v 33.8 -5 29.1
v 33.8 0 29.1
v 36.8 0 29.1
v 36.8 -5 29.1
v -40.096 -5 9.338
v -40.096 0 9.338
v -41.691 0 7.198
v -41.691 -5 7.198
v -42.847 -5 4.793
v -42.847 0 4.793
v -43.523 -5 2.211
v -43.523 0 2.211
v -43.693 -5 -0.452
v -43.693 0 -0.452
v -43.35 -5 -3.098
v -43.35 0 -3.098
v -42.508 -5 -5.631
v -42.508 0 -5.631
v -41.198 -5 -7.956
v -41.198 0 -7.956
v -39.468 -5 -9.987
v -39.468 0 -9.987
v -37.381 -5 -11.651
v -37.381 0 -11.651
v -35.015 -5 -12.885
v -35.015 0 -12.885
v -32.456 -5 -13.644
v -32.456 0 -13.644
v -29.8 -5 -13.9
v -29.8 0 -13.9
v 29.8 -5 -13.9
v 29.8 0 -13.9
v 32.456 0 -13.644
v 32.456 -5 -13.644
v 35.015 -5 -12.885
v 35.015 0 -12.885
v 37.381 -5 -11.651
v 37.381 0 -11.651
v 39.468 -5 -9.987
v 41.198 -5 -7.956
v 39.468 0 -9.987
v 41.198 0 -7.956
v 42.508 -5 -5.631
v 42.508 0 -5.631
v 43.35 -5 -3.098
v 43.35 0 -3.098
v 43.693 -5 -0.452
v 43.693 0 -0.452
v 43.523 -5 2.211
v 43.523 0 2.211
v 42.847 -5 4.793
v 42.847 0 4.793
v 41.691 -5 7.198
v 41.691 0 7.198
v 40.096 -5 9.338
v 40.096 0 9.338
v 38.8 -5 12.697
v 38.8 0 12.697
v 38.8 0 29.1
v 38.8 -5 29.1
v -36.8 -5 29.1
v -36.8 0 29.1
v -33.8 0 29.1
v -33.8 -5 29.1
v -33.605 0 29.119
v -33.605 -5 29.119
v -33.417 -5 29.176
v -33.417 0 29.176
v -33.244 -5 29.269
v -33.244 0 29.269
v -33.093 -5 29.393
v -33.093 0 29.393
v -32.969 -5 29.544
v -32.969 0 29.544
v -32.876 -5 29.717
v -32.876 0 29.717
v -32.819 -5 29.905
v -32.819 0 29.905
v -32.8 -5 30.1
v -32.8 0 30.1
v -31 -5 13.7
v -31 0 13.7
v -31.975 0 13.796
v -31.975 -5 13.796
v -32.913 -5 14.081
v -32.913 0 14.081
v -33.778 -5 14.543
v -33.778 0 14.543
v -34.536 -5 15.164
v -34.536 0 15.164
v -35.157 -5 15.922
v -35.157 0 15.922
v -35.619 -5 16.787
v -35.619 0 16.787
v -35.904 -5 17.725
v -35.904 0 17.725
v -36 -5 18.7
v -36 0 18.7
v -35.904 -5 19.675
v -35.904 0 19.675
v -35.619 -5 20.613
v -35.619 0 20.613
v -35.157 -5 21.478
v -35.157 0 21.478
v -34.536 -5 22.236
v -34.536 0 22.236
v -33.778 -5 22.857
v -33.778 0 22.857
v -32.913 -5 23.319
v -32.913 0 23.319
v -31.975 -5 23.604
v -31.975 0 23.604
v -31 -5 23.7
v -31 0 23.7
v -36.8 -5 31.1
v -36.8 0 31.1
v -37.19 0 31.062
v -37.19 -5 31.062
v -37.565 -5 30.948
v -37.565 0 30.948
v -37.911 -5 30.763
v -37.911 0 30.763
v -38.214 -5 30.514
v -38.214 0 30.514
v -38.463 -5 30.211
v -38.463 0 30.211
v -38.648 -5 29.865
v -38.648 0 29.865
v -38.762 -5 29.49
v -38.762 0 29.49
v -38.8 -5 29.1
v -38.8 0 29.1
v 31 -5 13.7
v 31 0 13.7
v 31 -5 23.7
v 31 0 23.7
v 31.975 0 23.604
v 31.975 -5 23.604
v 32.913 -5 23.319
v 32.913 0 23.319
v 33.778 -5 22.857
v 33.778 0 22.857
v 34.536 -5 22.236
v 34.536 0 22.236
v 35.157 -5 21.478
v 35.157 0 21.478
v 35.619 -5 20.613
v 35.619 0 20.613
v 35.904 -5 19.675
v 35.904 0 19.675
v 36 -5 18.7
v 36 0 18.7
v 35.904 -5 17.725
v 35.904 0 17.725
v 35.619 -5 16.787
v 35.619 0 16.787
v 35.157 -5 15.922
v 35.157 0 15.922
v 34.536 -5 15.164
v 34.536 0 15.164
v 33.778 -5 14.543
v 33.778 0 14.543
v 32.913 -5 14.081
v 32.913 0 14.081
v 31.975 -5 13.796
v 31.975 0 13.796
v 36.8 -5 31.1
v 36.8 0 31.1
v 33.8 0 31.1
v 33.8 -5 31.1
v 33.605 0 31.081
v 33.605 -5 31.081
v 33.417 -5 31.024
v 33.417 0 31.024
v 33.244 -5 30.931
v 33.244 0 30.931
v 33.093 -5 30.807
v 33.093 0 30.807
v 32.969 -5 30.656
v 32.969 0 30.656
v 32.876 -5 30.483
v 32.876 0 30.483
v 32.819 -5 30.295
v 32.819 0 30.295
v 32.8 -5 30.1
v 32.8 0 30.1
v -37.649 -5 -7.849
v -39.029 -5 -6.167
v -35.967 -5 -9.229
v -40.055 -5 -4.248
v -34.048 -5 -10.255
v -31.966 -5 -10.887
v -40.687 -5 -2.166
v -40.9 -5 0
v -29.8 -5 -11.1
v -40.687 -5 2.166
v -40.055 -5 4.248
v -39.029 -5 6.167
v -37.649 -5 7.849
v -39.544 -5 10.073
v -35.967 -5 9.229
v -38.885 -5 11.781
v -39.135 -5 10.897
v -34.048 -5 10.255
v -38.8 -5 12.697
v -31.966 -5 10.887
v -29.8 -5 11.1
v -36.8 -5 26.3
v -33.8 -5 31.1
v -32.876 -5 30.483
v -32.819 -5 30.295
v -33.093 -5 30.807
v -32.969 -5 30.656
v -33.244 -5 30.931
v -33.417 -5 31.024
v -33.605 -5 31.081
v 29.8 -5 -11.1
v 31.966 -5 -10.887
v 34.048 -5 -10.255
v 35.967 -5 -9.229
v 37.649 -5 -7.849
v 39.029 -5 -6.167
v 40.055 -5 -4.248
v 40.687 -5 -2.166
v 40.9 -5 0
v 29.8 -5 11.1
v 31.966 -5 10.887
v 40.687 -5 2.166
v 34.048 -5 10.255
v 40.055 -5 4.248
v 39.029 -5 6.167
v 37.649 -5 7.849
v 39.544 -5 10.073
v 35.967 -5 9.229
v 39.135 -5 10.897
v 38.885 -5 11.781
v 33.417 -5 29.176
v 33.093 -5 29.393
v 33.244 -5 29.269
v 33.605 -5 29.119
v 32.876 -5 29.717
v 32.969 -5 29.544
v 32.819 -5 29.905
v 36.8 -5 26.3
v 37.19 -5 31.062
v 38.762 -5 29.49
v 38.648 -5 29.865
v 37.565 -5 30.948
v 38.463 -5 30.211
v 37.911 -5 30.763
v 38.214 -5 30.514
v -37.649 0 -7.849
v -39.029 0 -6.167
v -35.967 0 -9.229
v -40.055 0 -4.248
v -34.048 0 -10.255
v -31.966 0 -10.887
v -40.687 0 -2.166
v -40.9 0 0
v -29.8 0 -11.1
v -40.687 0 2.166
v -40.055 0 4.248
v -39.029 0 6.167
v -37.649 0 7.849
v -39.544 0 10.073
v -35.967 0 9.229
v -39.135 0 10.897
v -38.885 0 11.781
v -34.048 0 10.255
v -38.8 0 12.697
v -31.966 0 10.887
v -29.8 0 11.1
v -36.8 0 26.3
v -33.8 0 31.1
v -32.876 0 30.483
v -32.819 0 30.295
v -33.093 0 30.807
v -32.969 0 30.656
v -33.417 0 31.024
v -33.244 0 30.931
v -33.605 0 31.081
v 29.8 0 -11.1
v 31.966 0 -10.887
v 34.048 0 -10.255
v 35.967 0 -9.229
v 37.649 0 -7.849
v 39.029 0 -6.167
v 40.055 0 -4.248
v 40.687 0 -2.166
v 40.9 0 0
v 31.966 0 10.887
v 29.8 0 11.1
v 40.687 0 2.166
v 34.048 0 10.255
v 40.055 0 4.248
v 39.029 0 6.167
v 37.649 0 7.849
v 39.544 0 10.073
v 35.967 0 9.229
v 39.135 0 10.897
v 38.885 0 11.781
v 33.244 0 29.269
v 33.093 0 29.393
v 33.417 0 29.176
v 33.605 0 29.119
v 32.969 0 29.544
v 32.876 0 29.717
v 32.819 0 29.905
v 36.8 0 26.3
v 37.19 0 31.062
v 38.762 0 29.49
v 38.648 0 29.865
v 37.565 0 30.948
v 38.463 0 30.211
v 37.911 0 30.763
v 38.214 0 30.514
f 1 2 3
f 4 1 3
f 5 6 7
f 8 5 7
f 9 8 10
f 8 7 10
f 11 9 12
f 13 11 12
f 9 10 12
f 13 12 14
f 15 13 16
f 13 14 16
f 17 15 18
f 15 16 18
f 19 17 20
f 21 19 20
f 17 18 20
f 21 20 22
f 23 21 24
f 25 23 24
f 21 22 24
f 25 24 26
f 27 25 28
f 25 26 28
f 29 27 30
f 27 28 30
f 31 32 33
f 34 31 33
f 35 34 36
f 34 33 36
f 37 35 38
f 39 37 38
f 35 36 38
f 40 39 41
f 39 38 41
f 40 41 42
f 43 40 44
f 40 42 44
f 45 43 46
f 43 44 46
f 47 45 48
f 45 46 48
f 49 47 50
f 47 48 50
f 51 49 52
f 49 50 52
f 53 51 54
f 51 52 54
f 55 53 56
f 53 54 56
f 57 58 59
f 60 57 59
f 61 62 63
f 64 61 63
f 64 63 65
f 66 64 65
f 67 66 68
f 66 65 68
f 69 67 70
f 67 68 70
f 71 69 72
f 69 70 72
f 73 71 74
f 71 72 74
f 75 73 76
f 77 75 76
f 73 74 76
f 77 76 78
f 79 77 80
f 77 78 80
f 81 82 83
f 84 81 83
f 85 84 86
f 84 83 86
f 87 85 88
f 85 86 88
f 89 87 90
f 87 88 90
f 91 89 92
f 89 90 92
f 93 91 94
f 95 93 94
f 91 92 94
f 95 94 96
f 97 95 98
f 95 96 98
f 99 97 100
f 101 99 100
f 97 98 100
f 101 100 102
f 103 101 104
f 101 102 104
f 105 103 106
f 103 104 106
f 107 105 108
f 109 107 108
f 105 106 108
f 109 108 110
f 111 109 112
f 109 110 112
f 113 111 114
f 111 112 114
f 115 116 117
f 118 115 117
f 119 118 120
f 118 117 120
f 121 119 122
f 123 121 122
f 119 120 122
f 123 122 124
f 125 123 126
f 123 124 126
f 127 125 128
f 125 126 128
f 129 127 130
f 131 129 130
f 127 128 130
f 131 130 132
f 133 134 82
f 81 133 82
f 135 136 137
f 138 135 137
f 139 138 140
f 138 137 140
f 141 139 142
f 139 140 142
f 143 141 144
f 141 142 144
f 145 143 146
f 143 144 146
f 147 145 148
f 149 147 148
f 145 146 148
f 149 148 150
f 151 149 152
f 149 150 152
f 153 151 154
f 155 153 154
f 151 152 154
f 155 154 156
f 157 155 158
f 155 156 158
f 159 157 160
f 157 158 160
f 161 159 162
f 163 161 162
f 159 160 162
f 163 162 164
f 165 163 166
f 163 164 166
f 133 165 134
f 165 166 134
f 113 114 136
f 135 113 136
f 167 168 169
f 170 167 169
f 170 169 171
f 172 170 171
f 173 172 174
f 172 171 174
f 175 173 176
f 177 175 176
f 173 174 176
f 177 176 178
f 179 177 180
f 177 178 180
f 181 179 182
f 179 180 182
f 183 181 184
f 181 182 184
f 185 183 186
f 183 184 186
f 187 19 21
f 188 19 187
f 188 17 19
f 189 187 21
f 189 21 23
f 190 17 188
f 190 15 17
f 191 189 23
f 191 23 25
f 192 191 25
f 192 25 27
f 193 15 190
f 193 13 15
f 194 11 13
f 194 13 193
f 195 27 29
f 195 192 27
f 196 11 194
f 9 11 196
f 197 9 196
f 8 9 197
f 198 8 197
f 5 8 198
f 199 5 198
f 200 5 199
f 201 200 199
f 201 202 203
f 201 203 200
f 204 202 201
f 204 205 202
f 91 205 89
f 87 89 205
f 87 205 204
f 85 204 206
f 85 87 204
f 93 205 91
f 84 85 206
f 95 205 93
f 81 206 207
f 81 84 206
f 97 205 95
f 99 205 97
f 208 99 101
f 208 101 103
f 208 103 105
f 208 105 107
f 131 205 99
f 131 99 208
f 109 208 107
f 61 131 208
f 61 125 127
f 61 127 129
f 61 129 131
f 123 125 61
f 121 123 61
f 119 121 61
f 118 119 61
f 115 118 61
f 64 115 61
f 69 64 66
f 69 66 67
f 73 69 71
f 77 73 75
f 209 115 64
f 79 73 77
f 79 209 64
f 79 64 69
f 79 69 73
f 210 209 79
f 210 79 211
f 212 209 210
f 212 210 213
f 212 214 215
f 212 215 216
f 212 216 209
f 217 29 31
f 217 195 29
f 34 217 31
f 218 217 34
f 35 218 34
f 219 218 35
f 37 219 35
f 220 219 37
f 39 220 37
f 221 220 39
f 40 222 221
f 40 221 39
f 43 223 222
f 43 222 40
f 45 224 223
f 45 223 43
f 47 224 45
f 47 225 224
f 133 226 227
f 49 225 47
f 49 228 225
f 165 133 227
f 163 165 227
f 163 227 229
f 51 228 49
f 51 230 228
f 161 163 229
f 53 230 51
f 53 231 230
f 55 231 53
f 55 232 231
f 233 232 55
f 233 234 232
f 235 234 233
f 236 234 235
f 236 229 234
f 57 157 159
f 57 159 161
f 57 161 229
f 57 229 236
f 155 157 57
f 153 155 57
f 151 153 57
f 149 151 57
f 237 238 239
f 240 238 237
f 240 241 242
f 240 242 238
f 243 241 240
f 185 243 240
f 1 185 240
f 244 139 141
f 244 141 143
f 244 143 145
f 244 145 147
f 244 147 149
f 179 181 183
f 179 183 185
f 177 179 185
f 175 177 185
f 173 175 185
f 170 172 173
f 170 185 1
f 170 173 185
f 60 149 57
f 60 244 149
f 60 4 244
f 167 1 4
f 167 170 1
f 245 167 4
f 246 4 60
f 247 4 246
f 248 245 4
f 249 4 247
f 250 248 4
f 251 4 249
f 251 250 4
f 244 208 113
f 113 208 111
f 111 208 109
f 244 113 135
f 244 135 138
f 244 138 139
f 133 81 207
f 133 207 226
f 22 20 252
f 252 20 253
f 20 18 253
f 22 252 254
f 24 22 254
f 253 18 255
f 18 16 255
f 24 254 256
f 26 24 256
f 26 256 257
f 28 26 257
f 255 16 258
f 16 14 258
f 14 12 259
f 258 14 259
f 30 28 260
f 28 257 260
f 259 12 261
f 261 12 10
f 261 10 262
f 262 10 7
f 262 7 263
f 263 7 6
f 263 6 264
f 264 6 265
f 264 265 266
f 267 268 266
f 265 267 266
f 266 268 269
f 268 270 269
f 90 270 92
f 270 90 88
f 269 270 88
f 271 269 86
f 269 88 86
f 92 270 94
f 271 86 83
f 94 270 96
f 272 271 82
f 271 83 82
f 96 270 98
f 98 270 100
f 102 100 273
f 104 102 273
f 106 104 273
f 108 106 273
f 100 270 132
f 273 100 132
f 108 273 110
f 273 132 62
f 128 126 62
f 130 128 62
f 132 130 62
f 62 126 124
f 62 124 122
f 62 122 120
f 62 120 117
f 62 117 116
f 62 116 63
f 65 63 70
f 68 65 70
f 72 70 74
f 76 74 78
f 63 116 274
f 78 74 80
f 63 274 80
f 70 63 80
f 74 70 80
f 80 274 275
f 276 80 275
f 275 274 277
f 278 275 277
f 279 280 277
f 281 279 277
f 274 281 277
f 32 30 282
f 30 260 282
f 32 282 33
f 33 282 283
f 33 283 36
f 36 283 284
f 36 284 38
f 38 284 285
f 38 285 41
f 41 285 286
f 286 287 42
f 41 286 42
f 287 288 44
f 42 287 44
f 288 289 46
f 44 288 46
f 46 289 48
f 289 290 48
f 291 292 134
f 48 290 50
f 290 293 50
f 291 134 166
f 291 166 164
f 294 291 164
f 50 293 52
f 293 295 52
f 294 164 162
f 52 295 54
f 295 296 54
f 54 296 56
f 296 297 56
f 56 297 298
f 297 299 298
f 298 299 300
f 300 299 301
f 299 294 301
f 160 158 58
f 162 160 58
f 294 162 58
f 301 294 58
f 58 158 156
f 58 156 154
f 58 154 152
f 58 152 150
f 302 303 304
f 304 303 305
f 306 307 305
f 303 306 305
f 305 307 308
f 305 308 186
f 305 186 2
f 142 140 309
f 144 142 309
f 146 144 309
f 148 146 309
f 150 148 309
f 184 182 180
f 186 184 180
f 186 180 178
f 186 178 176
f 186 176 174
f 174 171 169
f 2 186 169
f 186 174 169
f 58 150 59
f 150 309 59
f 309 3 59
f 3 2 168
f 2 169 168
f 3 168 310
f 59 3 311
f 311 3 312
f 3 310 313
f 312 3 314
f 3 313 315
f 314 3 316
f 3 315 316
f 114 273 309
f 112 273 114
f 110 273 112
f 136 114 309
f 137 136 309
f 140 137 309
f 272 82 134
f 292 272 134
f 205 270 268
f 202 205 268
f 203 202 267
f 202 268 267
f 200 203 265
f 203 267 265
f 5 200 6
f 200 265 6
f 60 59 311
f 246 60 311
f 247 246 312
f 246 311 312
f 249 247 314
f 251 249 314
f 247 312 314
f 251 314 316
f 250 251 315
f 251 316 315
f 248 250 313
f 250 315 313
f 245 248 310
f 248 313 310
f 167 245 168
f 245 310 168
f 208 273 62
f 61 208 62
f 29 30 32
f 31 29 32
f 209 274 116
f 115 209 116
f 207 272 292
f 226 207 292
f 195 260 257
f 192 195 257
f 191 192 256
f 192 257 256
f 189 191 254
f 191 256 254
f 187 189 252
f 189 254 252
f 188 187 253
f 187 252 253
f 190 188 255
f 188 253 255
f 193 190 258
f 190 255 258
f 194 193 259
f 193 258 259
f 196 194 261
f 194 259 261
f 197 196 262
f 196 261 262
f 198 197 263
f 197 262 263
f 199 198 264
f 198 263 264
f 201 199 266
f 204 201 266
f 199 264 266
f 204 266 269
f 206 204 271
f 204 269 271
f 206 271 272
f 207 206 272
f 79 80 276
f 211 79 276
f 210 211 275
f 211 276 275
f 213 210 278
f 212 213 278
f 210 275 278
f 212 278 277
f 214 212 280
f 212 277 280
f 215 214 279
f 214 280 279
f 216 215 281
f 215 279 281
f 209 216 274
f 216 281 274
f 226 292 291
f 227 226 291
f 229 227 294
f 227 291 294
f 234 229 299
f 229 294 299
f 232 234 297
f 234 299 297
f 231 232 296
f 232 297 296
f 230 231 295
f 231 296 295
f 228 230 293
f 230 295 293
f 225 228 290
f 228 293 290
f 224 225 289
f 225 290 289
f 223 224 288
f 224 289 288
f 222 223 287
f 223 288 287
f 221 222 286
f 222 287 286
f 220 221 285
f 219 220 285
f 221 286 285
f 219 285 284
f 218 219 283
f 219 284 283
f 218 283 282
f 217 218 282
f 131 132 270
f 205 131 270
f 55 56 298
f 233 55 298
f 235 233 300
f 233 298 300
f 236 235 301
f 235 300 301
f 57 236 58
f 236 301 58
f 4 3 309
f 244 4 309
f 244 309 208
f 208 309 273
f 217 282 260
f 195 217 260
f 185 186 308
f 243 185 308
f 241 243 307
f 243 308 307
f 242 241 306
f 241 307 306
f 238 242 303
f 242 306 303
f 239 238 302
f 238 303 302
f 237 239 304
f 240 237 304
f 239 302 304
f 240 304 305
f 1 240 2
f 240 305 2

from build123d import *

# Parameters (mm, degrees)
F1_DEPTH = 5


with BuildPart() as f1:
    # F0 (on Front) → F1 (new body)
    with BuildSketch(Plane.XZ):
        with BuildLine():
            Line((-29.8, -13.9), (29.8, -13.9))
            ThreePointArc((29.8, -13.9), (42.508398, -5.630864), (40.096296, 9.337895))
            ThreePointArc((40.096296, 9.337895), (39.135318, 10.896644), (38.8, 12.69685))
            Line((38.8, 12.69685), (38.8, 29.1))
            ThreePointArc((38.8, 29.1), (38.214214, 30.514214), (36.8, 31.1))
            Line((36.8, 31.1), (33.8, 31.1))
            ThreePointArc((33.8, 31.1), (33.092893, 30.807107), (32.8, 30.1))
            ThreePointArc((32.8, 30.1), (33.092893, 29.392893), (33.8, 29.1))
            Line((33.8, 29.1), (36.8, 29.1))
            Line((36.8, 29.1), (36.8, 26.3))
            Line((36.8, 26.3), (-36.8, 26.3))
            Line((-36.8, 26.3), (-36.8, 29.1))
            Line((-36.8, 29.1), (-33.8, 29.1))
            ThreePointArc((-33.8, 29.1), (-33.092893, 29.392893), (-32.8, 30.1))
            ThreePointArc((-32.8, 30.1), (-33.092893, 30.807107), (-33.8, 31.1))
            Line((-33.8, 31.1), (-36.8, 31.1))
            ThreePointArc((-36.8, 31.1), (-38.214214, 30.514214), (-38.8, 29.1))
            Line((-38.8, 29.1), (-38.8, 12.69685))
            ThreePointArc((-38.8, 12.69685), (-39.135318, 10.896644), (-40.096296, 9.337895))
            ThreePointArc((-40.096296, 9.337895), (-42.508398, -5.630864), (-29.8, -13.9))
        make_face()
        with BuildLine():
            ThreePointArc((29.8, 11.1), (40.9, 0), (29.8, -11.1))
            Line((29.8, -11.1), (-29.8, -11.1))
            ThreePointArc((-29.8, -11.1), (-40.9, 0), (-29.8, 11.1))
            Line((-29.8, 11.1), (29.8, 11.1))
        make_face(mode=Mode.SUBTRACT)
        with BuildLine():
            ThreePointArc((-31, 13.7), (-36, 18.7), (-31, 23.7))
            Line((-31, 23.7), (31, 23.7))
            ThreePointArc((31, 23.7), (36, 18.7), (31, 13.7))
            Line((31, 13.7), (-31, 13.7))
        make_face(mode=Mode.SUBTRACT)
    extrude(amount=F1_DEPTH)


solid = f1.part
